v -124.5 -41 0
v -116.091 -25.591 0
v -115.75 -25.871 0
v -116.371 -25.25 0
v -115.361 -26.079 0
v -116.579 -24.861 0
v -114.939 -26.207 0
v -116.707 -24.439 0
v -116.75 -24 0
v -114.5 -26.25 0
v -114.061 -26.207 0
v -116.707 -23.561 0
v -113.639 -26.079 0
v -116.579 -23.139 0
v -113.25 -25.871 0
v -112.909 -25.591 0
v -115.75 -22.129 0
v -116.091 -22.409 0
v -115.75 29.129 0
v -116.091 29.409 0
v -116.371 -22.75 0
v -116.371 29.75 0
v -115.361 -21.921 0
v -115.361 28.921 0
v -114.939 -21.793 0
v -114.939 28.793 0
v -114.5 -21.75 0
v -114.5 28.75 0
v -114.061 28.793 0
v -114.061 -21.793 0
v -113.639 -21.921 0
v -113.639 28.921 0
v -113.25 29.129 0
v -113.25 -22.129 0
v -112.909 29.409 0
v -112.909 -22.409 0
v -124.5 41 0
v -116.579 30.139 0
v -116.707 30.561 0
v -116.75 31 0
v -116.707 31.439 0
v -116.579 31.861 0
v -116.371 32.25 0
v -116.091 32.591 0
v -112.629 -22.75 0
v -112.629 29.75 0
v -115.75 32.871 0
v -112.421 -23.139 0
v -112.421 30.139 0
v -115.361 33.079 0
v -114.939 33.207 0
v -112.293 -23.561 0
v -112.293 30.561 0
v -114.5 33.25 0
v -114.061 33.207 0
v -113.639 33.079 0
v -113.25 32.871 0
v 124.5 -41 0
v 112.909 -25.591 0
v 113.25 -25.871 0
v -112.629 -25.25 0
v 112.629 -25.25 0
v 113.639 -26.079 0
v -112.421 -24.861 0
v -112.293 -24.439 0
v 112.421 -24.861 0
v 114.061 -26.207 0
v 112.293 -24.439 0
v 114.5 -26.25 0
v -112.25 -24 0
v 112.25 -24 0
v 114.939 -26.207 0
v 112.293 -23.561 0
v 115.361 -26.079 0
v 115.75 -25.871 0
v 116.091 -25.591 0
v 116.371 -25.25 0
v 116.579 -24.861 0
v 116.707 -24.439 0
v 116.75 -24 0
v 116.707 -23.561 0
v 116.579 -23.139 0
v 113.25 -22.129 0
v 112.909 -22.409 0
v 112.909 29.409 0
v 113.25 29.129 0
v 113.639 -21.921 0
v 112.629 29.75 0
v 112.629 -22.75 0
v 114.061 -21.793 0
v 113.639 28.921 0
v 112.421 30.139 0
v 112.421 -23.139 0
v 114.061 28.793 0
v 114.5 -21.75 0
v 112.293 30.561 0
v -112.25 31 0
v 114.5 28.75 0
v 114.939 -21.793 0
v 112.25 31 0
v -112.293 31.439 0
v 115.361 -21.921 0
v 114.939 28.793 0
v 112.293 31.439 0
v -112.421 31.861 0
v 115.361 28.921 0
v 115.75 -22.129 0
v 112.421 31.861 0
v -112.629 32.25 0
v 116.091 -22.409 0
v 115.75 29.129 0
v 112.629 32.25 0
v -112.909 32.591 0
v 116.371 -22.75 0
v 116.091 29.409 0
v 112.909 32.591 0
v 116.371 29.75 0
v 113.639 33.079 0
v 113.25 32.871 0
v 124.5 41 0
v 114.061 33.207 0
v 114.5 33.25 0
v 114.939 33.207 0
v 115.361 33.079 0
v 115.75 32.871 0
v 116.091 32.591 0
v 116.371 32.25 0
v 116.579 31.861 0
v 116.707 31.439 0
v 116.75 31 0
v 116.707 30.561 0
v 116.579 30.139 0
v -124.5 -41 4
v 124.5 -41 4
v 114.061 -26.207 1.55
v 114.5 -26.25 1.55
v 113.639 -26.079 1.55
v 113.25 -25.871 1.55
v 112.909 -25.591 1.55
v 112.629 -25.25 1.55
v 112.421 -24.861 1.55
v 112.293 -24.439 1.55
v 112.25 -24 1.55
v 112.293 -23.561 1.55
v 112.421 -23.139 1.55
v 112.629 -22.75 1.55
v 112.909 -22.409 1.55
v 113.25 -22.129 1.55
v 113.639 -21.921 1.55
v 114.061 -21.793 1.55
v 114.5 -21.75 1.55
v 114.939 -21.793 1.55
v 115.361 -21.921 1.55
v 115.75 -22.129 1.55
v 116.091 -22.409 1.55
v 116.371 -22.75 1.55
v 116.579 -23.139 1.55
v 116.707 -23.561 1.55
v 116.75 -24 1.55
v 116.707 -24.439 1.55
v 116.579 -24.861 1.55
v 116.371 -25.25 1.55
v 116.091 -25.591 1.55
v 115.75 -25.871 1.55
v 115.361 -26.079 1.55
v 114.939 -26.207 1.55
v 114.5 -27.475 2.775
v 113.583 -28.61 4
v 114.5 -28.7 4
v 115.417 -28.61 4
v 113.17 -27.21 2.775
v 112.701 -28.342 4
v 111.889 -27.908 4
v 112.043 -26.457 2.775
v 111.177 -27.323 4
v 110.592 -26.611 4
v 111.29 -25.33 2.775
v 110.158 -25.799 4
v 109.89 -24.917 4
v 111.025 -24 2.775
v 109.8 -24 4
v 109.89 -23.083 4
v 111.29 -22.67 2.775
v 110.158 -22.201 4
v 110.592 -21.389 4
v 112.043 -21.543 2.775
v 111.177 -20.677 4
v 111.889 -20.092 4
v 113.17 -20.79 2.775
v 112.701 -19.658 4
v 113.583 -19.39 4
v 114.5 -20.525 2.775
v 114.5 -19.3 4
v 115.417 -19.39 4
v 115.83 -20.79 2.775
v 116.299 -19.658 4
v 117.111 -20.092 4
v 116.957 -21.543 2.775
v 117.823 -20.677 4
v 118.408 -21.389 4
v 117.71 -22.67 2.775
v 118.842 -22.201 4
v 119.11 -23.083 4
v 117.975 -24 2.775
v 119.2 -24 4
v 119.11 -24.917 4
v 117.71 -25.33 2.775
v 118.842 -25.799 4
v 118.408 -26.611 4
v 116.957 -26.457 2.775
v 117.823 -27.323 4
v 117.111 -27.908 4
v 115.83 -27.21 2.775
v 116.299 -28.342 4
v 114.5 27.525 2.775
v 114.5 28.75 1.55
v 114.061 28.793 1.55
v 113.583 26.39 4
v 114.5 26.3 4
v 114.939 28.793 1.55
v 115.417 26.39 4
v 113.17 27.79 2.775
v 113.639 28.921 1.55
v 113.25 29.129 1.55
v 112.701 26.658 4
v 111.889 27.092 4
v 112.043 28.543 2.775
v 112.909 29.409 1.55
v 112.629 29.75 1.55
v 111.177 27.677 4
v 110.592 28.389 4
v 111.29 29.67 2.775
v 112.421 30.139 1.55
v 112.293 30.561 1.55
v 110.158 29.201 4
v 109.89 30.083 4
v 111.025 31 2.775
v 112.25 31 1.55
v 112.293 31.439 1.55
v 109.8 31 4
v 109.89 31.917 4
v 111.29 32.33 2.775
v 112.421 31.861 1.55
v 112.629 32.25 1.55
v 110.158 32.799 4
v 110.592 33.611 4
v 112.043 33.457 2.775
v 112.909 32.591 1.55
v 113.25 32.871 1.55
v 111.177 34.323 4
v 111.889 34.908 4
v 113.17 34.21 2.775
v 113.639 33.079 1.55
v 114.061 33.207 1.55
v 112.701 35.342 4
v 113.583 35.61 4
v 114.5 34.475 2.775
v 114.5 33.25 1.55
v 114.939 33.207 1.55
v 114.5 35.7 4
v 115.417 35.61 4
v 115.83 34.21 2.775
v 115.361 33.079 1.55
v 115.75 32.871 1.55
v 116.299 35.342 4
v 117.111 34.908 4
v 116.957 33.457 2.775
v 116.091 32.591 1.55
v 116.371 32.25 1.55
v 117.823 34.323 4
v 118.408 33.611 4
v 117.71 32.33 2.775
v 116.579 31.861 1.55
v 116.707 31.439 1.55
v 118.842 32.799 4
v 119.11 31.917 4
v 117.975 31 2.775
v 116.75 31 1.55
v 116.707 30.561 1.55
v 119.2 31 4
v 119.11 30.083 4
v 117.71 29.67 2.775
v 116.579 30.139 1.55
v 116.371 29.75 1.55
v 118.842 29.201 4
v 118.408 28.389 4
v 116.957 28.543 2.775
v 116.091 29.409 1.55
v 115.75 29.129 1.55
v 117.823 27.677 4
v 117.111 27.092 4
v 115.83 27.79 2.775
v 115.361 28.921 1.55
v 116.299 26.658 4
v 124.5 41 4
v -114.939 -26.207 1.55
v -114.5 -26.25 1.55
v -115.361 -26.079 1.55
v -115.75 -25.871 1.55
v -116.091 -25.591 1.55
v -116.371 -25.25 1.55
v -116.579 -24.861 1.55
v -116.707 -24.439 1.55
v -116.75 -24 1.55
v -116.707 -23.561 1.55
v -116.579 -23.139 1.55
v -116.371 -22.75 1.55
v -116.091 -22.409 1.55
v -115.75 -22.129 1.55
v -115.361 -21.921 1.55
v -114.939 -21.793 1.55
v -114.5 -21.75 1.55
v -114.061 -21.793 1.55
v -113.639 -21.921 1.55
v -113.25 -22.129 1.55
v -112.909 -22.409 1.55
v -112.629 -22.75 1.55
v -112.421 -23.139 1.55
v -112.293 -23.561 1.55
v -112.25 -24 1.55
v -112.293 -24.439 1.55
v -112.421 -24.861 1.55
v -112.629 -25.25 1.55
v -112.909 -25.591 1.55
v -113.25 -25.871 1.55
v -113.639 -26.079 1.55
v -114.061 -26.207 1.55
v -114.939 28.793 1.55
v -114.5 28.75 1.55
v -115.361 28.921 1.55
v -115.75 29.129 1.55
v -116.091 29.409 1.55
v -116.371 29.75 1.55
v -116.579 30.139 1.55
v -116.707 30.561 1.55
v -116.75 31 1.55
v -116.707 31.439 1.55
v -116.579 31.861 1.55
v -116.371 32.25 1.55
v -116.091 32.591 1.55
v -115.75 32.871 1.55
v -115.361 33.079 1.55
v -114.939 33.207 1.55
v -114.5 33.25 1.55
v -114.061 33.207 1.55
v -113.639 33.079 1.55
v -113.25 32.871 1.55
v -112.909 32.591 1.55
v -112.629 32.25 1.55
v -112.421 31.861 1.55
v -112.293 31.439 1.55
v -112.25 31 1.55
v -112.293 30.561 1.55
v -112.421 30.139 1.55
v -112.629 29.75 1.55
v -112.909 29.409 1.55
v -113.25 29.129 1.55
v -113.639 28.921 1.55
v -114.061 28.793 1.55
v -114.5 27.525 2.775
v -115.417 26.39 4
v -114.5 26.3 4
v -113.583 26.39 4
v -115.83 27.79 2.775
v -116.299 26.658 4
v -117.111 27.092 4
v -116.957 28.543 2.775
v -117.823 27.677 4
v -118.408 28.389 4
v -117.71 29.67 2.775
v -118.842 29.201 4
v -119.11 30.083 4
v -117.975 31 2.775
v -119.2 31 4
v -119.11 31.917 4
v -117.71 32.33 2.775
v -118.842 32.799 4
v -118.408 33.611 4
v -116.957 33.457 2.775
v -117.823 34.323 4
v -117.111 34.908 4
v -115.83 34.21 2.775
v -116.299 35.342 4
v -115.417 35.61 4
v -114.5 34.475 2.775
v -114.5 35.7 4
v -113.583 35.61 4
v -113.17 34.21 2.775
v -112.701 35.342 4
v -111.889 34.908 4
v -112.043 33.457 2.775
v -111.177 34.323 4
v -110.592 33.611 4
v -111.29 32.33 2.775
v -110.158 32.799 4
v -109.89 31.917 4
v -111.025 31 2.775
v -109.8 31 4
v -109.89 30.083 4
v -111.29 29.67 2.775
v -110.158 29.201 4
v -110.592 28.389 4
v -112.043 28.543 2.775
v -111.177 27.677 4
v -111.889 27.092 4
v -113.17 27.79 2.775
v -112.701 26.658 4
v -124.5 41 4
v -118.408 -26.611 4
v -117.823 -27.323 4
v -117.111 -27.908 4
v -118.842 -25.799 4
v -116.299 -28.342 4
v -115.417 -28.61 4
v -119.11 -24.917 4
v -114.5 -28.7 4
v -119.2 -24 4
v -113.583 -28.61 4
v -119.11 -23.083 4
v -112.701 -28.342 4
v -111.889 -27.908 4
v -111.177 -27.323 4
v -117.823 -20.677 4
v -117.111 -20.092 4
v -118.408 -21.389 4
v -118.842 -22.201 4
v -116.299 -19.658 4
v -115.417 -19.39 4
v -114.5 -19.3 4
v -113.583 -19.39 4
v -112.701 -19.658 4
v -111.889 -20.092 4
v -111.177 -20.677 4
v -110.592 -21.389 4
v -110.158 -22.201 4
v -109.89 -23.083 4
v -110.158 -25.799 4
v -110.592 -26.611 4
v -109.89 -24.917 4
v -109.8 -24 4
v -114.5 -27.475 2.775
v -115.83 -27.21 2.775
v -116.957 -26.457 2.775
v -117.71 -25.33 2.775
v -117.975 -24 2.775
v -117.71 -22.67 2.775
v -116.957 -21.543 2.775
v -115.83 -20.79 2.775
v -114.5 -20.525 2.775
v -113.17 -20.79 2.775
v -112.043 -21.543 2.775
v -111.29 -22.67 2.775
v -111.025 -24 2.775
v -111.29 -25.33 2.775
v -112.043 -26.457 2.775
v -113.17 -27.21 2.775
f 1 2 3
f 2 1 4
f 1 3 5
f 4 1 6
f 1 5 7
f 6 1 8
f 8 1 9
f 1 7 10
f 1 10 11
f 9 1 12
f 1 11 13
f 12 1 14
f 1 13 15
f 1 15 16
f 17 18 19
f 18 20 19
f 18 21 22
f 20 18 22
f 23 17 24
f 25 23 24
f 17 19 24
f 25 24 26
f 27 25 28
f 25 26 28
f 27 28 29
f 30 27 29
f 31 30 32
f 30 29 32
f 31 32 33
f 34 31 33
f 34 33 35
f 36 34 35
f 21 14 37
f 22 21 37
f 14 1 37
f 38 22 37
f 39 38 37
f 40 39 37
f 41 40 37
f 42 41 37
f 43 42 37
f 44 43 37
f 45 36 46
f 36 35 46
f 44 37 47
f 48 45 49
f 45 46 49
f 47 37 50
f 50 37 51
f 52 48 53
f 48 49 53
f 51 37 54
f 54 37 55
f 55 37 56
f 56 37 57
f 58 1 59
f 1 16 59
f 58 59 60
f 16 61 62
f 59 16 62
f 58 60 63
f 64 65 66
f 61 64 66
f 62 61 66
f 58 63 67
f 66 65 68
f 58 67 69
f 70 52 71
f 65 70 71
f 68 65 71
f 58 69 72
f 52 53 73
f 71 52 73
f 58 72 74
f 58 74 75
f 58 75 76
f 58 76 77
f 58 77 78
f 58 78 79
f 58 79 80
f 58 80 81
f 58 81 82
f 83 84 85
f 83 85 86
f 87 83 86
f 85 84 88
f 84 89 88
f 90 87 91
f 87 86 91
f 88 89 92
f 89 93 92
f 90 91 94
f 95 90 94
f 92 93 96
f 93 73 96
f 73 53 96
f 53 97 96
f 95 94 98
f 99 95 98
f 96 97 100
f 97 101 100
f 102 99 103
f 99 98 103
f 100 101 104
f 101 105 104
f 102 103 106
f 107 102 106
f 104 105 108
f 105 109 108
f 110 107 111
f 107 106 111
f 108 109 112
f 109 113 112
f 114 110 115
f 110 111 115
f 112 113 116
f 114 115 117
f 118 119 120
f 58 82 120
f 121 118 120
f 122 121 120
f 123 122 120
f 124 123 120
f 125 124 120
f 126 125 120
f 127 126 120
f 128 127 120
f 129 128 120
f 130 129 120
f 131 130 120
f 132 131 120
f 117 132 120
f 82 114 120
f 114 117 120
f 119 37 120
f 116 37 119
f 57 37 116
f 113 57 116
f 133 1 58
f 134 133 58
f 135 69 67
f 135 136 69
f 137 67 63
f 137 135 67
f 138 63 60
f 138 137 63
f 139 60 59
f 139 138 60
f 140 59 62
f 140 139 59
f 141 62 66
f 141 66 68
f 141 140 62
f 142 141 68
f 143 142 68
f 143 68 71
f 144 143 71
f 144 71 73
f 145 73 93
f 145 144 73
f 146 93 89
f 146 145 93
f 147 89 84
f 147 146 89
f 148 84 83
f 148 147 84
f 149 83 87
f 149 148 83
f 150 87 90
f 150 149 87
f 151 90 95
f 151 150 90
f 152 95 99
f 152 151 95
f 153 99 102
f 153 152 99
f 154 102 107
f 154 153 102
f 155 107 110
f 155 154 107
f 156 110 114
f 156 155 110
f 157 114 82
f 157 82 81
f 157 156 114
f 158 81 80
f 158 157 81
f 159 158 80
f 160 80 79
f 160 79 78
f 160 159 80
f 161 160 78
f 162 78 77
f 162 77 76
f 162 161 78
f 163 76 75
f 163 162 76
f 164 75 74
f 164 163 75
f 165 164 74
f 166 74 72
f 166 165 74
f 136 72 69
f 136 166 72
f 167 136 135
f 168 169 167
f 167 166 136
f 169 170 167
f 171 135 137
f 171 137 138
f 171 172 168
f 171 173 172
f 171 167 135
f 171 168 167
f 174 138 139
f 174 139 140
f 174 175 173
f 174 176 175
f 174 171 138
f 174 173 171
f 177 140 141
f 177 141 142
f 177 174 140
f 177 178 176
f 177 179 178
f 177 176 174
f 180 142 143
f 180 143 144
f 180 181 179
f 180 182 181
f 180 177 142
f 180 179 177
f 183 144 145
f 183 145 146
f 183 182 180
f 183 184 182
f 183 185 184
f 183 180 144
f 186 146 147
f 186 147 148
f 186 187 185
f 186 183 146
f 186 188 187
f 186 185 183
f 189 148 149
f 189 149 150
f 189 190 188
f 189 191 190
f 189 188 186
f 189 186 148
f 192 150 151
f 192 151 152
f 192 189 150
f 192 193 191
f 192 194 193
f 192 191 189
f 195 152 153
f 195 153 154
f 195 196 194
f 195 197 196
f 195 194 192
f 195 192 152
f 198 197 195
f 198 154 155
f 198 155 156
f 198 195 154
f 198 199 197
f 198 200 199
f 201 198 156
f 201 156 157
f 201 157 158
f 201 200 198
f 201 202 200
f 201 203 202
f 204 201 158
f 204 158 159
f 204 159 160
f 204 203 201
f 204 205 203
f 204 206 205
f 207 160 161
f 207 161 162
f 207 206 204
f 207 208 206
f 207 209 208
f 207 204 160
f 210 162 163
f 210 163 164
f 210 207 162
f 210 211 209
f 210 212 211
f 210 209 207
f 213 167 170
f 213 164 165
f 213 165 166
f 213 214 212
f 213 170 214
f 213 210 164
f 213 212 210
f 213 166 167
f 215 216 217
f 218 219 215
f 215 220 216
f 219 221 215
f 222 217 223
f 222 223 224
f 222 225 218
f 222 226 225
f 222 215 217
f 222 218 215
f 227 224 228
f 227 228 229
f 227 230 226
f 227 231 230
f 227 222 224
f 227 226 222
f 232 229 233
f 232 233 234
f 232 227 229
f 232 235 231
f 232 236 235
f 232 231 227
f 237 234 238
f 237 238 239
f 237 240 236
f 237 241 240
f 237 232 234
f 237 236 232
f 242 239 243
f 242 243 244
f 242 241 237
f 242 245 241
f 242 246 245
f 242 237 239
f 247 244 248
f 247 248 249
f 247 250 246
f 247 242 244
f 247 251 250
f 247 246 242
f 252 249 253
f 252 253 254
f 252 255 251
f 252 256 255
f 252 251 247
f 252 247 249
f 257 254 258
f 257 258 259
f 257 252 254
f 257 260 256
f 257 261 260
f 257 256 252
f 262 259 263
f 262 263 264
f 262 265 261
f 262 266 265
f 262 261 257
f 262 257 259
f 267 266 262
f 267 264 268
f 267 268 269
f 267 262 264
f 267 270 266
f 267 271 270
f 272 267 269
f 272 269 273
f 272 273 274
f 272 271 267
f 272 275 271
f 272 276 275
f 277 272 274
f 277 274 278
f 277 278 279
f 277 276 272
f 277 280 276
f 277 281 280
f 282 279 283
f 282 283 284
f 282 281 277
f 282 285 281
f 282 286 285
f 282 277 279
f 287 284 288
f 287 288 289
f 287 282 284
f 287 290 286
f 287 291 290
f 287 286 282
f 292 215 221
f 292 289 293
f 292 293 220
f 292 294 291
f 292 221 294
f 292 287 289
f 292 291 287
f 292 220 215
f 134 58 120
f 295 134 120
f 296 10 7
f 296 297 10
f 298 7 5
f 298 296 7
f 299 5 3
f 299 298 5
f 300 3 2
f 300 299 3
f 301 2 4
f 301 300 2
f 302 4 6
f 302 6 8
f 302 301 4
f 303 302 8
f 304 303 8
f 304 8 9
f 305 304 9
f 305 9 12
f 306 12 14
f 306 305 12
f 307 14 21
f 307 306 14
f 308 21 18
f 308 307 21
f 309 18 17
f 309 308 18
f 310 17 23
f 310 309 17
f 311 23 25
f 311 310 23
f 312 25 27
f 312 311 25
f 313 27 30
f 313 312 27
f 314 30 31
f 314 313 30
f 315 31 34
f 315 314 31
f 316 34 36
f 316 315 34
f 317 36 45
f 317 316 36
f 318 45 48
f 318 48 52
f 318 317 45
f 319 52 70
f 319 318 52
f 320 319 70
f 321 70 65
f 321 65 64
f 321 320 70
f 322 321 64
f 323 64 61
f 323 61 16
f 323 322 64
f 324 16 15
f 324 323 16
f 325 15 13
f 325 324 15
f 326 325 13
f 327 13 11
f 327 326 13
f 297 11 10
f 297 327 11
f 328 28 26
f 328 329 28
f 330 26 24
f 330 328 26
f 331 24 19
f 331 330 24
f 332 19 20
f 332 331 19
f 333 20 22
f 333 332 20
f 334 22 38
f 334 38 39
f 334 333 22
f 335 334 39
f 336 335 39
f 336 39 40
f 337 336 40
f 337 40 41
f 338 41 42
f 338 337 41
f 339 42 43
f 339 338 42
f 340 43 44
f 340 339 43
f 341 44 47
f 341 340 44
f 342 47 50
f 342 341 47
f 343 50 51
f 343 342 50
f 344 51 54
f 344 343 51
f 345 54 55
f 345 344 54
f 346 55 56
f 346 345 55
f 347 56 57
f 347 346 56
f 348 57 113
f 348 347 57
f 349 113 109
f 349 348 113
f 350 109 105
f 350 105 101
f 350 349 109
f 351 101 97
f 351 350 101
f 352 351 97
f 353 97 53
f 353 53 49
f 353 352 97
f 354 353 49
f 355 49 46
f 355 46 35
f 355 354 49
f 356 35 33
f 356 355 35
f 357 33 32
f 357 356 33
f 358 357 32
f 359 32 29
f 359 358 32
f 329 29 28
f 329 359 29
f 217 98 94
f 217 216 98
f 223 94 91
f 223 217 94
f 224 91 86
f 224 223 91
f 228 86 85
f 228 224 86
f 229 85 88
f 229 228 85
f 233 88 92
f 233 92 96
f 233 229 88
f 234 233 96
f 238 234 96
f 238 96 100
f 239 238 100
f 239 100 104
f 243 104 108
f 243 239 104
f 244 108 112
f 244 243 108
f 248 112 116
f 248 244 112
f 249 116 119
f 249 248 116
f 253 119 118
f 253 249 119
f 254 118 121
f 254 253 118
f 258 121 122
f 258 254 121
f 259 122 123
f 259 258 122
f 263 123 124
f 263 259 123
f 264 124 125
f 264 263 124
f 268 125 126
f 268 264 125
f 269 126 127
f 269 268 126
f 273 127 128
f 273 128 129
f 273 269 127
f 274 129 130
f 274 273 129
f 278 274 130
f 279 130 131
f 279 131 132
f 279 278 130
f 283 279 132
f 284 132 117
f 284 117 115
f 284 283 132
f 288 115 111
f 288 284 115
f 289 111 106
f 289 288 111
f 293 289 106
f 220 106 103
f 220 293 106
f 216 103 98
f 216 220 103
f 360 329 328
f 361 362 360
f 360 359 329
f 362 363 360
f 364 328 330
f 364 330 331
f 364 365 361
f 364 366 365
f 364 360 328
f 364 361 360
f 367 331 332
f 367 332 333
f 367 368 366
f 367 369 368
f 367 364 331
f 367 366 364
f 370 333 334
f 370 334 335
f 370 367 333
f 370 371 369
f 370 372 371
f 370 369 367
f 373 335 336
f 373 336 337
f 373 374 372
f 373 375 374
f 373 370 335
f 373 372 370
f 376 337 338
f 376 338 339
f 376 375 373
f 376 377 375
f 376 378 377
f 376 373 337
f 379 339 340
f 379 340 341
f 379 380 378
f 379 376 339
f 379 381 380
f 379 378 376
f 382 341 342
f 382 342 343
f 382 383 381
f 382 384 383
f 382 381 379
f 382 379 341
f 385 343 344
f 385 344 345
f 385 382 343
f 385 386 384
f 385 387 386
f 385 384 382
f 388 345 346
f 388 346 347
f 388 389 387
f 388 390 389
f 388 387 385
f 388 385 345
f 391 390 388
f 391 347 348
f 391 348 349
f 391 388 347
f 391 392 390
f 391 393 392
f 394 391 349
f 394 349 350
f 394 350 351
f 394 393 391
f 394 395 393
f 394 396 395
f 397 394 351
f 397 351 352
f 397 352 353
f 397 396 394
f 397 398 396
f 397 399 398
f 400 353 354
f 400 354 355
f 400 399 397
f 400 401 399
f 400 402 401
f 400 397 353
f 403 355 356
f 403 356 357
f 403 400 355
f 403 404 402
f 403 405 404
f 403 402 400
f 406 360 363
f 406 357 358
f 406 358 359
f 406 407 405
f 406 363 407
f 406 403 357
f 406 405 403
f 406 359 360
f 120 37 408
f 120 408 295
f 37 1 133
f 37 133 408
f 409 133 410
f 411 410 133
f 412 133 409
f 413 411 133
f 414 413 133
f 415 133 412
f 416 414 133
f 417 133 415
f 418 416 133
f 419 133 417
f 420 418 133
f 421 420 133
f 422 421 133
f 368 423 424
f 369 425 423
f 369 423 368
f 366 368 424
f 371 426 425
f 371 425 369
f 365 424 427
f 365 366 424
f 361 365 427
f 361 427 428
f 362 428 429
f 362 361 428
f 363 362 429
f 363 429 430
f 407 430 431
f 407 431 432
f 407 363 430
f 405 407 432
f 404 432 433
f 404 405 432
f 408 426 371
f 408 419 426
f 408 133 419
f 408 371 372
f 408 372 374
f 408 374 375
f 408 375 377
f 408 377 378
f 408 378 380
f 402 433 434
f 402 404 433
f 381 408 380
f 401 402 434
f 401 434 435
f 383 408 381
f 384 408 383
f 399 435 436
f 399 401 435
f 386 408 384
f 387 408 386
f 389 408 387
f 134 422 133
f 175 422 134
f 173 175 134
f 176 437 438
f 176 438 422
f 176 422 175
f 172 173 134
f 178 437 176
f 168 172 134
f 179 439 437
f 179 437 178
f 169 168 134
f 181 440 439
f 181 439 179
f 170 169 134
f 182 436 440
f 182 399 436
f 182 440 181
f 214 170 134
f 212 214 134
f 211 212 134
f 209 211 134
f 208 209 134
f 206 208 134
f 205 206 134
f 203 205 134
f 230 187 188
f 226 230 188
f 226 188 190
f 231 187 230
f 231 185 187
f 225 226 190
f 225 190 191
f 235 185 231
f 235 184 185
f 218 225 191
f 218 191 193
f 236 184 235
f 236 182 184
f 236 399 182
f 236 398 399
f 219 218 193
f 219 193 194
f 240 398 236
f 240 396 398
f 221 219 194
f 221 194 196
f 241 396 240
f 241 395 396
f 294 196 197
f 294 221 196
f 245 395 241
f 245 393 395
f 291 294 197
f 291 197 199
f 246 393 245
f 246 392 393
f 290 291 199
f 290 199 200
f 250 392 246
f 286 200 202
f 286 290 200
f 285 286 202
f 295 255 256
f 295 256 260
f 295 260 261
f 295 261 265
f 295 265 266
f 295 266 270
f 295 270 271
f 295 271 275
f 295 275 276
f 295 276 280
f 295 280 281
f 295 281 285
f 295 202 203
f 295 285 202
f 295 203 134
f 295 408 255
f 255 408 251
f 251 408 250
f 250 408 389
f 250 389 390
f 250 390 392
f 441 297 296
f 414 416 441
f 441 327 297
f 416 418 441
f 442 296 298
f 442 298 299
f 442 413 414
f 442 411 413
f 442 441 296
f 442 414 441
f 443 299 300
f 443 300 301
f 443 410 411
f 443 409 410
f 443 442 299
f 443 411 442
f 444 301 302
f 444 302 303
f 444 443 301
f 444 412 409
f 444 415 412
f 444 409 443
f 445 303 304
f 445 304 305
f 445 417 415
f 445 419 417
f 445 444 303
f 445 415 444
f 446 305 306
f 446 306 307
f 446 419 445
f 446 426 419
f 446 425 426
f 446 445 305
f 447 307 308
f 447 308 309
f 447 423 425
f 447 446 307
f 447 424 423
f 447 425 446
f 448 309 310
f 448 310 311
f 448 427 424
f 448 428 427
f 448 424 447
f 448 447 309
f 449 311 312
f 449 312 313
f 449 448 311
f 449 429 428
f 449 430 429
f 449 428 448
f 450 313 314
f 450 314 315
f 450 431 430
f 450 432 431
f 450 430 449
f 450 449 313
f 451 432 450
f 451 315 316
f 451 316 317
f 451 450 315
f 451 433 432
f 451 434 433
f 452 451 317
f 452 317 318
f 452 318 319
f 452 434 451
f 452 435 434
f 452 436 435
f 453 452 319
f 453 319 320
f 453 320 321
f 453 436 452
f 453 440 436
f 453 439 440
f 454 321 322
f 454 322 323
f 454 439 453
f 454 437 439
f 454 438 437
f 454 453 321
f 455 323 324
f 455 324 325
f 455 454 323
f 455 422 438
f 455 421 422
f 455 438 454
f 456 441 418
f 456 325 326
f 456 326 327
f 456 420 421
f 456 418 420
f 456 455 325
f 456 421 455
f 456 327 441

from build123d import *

# Parameters (mm, degrees)
ESQUISSE1_W                                 = 249
ESQUISSE1_H                                 = 82
BOSS_EXTRU_1_DEPTH                          = 4
FRAISAGE_POUR_VIS_T_TE_FRAIS_E_M42_AT_COUNT = 2
FRAISAGE_POUR_VIS_T_TE_FRAIS_E_M42_AT_PITCH = 55
FRAISAGE_POUR_VIS_T_TE_FRAIS_E_M42_2_COUNT  = 2
FRAISAGE_POUR_VIS_T_TE_FRAIS_E_M42_2_PITCH  = 229
FRAISAGE_POUR_VIS_T_TE_FRAIS_E_M42_3_COUNT  = 2
FRAISAGE_POUR_VIS_T_TE_FRAIS_E_M42_3_PITCH  = 235.512207752


with BuildPart() as part:
    # Esquisse1 → Boss.-Extru.1 (new body)
    with BuildSketch(Plane.XY):
        Rectangle(ESQUISSE1_W, ESQUISSE1_H)
    extrude(amount=BOSS_EXTRU_1_DEPTH)

    # Esquisse6 → Fraisage pour vis à tête fraisée M42 (revolve, cut)
    with BuildSketch(Plane(origin=(-114.5, -24, 4), x_dir=(0, -1, 0), z_dir=(1, 0, 0))):
        Polygon((0, 0), (0, 4), (2.25, 4), (2.25, 2.45), (4.7, 0), align=None)
    fraisage_pour_vis_t_te_frais_e_m42 = revolve(axis=Axis((-114.5, -24, 10.35), (0, 0, -1)), mode=Mode.SUBTRACT)

    # Fraisage pour vis à tête fraisée M42 at: Fraisage pour vis à tête fraisée M42 ×2
    with Locations(*[(0, i * FRAISAGE_POUR_VIS_T_TE_FRAIS_E_M42_AT_PITCH, 0) for i in range(1, FRAISAGE_POUR_VIS_T_TE_FRAIS_E_M42_AT_COUNT)]):
        add(fraisage_pour_vis_t_te_frais_e_m42, mode=Mode.SUBTRACT)

    # Fraisage pour vis _ t_te frais_e M42 2: Fraisage pour vis à tête fraisée M42 ×2
    with Locations(*[(i * FRAISAGE_POUR_VIS_T_TE_FRAIS_E_M42_2_PITCH, 0, 0) for i in range(1, FRAISAGE_POUR_VIS_T_TE_FRAIS_E_M42_2_COUNT)]):
        add(fraisage_pour_vis_t_te_frais_e_m42, mode=Mode.SUBTRACT)

    # Fraisage pour vis _ t_te frais_e M42 3: Fraisage pour vis à tête fraisée M42 ×2
    with Locations(*[Vector(0.972348747, 0.233533542, 0) * (i * FRAISAGE_POUR_VIS_T_TE_FRAIS_E_M42_3_PITCH) for i in range(1, FRAISAGE_POUR_VIS_T_TE_FRAIS_E_M42_3_COUNT)]):
        add(fraisage_pour_vis_t_te_frais_e_m42, mode=Mode.SUBTRACT)


solid = part.part
